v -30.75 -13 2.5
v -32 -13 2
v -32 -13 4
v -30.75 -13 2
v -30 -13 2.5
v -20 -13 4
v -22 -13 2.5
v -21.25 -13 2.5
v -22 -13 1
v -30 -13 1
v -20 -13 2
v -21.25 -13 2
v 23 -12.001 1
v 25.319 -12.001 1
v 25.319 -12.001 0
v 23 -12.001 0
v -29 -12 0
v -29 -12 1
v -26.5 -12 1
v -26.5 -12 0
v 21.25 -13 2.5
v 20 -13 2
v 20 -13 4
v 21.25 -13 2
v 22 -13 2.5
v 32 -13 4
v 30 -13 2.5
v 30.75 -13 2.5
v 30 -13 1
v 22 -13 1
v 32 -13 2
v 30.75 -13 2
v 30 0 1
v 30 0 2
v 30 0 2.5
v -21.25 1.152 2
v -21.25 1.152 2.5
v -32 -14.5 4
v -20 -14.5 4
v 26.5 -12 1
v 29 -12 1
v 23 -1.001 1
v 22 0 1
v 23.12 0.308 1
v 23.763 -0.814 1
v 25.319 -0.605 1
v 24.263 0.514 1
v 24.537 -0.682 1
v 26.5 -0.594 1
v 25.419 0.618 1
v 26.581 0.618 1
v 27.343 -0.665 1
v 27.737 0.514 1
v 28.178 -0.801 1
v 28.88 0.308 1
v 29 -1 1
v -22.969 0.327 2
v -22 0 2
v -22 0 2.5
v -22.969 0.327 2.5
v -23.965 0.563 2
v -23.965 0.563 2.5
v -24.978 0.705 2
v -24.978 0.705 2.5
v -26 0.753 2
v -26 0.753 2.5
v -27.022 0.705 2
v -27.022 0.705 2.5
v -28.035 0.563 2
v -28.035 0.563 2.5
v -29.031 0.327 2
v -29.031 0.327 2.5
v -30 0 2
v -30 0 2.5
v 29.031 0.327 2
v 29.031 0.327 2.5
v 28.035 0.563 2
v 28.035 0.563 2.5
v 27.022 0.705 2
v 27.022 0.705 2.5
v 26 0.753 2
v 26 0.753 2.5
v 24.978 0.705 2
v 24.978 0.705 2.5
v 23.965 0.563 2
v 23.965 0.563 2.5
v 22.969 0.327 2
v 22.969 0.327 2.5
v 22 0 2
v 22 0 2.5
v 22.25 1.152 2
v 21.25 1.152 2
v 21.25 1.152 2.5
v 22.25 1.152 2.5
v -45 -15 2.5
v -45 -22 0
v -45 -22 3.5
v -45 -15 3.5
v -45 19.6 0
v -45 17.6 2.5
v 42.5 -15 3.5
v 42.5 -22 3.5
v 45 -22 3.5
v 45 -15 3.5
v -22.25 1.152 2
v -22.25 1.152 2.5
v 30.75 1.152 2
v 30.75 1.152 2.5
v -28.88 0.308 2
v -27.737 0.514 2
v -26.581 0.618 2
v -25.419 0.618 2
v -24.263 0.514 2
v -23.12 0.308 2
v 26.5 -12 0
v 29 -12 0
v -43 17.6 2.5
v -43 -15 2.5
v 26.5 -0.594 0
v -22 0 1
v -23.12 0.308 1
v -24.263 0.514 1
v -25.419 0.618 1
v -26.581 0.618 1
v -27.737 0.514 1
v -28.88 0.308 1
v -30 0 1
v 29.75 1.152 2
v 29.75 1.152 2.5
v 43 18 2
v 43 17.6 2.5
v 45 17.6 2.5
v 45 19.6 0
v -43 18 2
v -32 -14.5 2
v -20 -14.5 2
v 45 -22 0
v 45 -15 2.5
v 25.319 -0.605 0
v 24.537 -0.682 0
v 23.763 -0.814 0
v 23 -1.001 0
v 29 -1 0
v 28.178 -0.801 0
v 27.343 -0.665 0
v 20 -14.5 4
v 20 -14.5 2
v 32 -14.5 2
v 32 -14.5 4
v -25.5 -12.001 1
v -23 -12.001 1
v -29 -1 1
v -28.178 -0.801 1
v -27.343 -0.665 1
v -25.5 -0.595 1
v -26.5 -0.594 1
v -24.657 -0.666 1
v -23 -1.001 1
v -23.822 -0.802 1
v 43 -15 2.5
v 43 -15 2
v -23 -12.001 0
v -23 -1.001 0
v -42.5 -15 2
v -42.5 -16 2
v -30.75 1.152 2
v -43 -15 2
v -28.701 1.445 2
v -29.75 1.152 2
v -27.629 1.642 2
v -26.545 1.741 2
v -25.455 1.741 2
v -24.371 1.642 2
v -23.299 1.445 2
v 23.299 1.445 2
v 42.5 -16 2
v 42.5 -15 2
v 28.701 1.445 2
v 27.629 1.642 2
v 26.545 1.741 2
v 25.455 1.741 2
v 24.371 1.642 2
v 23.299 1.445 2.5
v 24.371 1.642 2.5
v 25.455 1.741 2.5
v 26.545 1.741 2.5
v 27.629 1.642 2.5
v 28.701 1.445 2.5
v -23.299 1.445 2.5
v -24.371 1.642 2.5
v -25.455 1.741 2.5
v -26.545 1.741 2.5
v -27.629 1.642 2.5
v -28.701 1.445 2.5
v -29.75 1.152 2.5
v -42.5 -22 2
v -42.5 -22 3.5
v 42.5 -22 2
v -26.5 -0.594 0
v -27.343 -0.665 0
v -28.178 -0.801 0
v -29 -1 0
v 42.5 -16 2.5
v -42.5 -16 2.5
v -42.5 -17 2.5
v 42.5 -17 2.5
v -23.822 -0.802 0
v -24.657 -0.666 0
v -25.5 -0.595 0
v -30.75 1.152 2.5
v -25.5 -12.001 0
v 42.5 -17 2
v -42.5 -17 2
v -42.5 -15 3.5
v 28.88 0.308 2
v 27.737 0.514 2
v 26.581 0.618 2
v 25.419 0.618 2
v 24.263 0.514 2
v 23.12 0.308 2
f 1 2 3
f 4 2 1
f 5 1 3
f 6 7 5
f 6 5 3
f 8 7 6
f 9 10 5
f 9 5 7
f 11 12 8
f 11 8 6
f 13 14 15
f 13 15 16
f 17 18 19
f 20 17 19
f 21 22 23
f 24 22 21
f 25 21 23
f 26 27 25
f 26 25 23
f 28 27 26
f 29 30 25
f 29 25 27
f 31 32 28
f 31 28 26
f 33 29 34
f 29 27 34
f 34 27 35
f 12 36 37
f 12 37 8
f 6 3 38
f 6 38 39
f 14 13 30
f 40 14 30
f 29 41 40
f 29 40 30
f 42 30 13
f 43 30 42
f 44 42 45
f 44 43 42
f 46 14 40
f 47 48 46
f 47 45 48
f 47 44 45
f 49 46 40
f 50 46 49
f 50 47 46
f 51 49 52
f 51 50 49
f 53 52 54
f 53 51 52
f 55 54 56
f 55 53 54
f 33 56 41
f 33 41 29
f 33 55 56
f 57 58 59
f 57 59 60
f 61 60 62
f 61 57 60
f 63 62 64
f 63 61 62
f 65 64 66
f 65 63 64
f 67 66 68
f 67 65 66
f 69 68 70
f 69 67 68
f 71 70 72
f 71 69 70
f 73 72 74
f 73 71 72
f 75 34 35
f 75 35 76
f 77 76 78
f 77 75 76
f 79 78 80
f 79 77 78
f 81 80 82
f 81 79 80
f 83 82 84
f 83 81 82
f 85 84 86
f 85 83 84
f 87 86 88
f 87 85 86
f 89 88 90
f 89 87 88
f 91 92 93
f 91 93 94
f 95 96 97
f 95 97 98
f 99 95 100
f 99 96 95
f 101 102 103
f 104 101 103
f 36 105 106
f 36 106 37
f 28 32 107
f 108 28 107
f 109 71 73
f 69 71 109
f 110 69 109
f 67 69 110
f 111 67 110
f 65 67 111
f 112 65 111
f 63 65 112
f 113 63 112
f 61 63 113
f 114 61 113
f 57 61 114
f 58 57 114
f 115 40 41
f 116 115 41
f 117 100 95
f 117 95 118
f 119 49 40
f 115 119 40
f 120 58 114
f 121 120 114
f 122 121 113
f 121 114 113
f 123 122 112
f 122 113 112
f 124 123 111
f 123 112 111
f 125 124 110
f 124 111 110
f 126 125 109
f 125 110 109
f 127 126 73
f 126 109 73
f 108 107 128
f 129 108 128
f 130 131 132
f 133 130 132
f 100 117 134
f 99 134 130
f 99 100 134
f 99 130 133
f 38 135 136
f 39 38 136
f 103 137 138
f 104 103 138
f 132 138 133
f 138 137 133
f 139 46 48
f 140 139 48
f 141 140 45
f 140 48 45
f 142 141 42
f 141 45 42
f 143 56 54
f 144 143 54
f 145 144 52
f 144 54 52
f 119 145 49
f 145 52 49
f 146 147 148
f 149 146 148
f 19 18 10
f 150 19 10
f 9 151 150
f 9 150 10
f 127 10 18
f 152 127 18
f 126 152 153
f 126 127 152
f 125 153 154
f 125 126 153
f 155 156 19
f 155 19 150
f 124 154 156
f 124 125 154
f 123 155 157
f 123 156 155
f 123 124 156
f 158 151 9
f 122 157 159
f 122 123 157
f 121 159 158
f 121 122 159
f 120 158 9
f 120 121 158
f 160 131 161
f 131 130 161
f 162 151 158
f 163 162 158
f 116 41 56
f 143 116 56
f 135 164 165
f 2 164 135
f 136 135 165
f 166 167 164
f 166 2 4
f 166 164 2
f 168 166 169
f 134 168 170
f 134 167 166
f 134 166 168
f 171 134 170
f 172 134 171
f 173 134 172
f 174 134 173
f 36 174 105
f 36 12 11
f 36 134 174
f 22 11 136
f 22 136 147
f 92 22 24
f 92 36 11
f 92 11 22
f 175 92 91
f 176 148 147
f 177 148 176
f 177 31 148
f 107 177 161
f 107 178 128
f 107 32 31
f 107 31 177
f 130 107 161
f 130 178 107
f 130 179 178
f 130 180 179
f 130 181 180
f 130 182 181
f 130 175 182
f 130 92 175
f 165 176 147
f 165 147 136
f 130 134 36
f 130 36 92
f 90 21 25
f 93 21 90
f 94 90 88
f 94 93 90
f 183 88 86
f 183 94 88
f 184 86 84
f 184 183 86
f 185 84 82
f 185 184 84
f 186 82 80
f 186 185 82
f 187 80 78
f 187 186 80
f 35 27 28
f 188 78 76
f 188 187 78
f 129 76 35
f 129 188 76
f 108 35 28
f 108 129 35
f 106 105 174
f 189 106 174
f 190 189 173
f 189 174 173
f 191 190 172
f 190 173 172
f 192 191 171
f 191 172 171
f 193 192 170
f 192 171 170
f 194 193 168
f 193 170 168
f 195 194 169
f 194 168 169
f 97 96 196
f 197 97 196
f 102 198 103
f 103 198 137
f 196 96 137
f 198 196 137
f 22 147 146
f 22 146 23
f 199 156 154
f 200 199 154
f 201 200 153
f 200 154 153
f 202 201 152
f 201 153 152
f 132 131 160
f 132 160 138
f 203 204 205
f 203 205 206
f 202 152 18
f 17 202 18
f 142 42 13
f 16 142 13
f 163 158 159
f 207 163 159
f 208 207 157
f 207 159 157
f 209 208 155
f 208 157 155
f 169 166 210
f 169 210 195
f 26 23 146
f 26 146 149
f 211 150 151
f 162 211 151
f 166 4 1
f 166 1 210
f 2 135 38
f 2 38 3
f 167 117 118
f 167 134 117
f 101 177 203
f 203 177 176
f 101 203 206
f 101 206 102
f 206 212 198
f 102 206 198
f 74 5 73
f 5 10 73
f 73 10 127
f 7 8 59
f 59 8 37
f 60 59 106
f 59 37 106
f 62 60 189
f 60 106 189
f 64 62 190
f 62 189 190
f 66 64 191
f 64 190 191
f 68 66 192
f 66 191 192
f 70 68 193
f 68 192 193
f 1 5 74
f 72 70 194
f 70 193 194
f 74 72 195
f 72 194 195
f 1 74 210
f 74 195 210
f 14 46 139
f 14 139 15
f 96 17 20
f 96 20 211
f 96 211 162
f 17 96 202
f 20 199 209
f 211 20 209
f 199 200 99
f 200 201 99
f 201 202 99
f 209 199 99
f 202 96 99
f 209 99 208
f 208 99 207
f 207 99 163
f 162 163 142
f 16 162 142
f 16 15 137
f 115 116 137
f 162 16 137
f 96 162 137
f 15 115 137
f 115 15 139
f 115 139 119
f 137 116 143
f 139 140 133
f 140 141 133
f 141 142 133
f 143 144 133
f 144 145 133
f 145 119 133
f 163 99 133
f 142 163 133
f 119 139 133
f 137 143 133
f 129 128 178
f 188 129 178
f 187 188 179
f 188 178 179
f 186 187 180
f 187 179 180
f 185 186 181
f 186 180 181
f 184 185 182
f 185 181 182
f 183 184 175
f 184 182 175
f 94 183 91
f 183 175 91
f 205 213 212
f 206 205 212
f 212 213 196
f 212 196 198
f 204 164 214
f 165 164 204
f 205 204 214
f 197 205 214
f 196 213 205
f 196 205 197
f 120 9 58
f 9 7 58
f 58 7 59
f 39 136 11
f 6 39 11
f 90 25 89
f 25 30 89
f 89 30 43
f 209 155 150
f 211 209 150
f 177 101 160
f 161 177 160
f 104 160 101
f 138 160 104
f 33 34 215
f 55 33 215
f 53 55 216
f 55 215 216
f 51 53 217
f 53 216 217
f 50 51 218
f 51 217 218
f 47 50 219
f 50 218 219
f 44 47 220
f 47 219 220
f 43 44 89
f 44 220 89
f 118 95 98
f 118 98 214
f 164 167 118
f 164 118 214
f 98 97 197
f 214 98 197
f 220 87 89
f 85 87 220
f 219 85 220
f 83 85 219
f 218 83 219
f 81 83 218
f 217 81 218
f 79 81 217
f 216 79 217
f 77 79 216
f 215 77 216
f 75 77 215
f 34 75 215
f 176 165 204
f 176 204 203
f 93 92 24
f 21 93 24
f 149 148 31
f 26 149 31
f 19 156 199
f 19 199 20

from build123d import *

# Parameters (mm, degrees)
SKETCH_W        = 90
SKETCH_H        = 44
PAD_DEPTH       = 2
POCKET_DEPTH    = 1
POCKET001_DEPTH = 5
SKETCH003_W     = 12
SKETCH003_H     = 1.5
PAD001_DEPTH    = 2
SKETCH004_W     = 2
SKETCH004_H     = 44
PAD002_DEPTH    = 2.5
SKETCH005_W     = 2.5
SKETCH005_H     = 7
PAD003_DEPTH    = 3.5
SKETCH006_W     = 85
SKETCH006_H     = 1
PAD004_DEPTH    = 0.5
PAD005_DEPTH    = 0.5
POCKET002_DEPTH = 90.001


with BuildPart() as part:
    # Sketch → Pad (new body)
    with BuildSketch(Plane.XY):
        Rectangle(SKETCH_W, SKETCH_H)
    extrude(amount=PAD_DEPTH)

    # Sketch001 → Pocket (cut)
    with BuildSketch(Plane.XY.offset(2)):
        with BuildLine():
            Line((-30, 0), (-30, -13))
            Line((-30, -13), (-22, -13))
            Line((-22, -13), (-22, 0))
            ThreePointArc((-22, 0), (-26, 0.630683), (-30, 0))
        make_face()
        with BuildLine():
            Line((22, 0), (22, -13))
            Line((22, -13), (30, -13))
            Line((30, -13), (30, 0))
            ThreePointArc((30, 0), (26, 0.630683), (22, 0))
        make_face()
    extrude(amount=-POCKET_DEPTH, mode=Mode.SUBTRACT)

    # Sketch002 → Pocket001 (cut)
    with BuildSketch(Plane.XY.offset(1)):
        with BuildLine():
            Line((-29, -1), (-29, -12))
            Line((-29, -12), (-26.5, -12))
            Line((-26.5, -0.594375), (-26.5, -12))
            ThreePointArc((-26.5, -0.594375), (-27.761713, -0.724996), (-29, -1))
        make_face()
        with BuildLine():
            Line((-23, -12.000917), (-23, -1.000917))
            ThreePointArc((-23, -1.000917), (-24.238285, -0.72589), (-25.5, -0.595257))
            Line((-25.5, -0.595257), (-25.5, -12.000917))
            Line((-25.5, -12.000917), (-23, -12.000917))
        make_face()
        with BuildLine():
            Line((23, -1.000917), (23, -12.000917))
            Line((25.318595, -12.000917), (23, -12.000917))
            Line((25.318595, -0.605014), (25.318595, -12.000917))
            ThreePointArc((25.318595, -0.605014), (24.148684, -0.740808), (23, -1.000917))
        make_face()
        with BuildLine():
            Line((29, -12), (29, -1))
            ThreePointArc((29, -1), (27.761713, -0.724996), (26.5, -0.594375))
            Line((26.5, -0.594375), (26.5, -12))
            Line((26.5, -12), (29, -12))
        make_face()
    extrude(amount=-POCKET001_DEPTH, mode=Mode.SUBTRACT)

    # Sketch003 → Pad001 (new body)
    with BuildSketch(Plane.XY.offset(2)):
        with Locations((-26, -13.75)):
            Rectangle(SKETCH003_W, SKETCH003_H)
        with Locations((26, -13.75)):
            Rectangle(SKETCH003_W, SKETCH003_H)
    extrude(amount=PAD001_DEPTH)

    # Sketch004 → Pad002 (new body)
    with BuildSketch(Plane(origin=(0, 0, 0), x_dir=(1, 0, 0), z_dir=(0, 0, -1))):
        with Locations((-44, 0)):
            Rectangle(SKETCH004_W, SKETCH004_H)
        with Locations((44, 0)):
            Rectangle(SKETCH004_W, SKETCH004_H)
    extrude(amount=-PAD002_DEPTH)

    # Sketch005 → Pad003 (new body)
    with BuildSketch(Plane(origin=(0, 0, 0), x_dir=(1, 0, 0), z_dir=(0, 0, -1))):
        with Locations((-43.75, 18.5)):
            Rectangle(SKETCH005_W, SKETCH005_H)
        with Locations((43.75, 18.5)):
            Rectangle(SKETCH005_W, SKETCH005_H)
    extrude(amount=-PAD003_DEPTH)

    # Sketch006 → Pad004 (new body)
    with BuildSketch(Plane.XY.offset(2)):
        with Locations((0, -16.5)):
            Rectangle(SKETCH006_W, SKETCH006_H)
    extrude(amount=PAD004_DEPTH)

    # Sketch007 → Pad005 (new body)
    with BuildSketch(Plane.XY.offset(2)):
        with BuildLine():
            Line((-30.75, -13), (-30.75, 1.152062))
            Line((-30.75, 1.152062), (-29.75, 1.152062))
            ThreePointArc((-22.25, 1.152062), (-26, 1.753049), (-29.75, 1.152062))
            Line((-22.25, 1.152062), (-21.25, 1.152062))
            Line((-21.25, 1.152062), (-21.25, -13))
            Line((-21.25, -13), (-22, -13))
            Line((-22, -13), (-22, 0))
            ThreePointArc((-22, 0), (-26, 0.753049), (-30, 0))
            Line((-30, -13), (-30, 0))
            Line((-30, -13), (-30.75, -13))
        make_face()
        with BuildLine():
            Line((21.25, 1.152062), (21.25, -13))
            Line((21.25, -13), (22, -13))
            Line((22, -13), (22, 0))
            ThreePointArc((30, 0), (26, 0.753049), (22, 0))
            Line((30, 0), (30, -13))
            Line((30, -13), (30.75, -13))
            Line((30.75, -13), (30.75, 1.152062))
            Line((30.75, 1.152062), (29.75, 1.152062))
            ThreePointArc((29.75, 1.152062), (26, 1.753049), (22.25, 1.152062))
            Line((21.25, 1.152062), (22.25, 1.152062))
        make_face()
    extrude(amount=PAD005_DEPTH)

    # Sketch008 → Pocket002 (cut, through all)
    with BuildSketch(Plane(origin=(-45, 0, 0), x_dir=(0, -1, 0), z_dir=(-1, 0, 0))):
        Polygon((-25.209874, 17.987658), (-5.209874, 17.987658), (-25.209874, -7.012342), align=None)
    extrude(amount=-POCKET002_DEPTH, mode=Mode.SUBTRACT)


solid = part.part
